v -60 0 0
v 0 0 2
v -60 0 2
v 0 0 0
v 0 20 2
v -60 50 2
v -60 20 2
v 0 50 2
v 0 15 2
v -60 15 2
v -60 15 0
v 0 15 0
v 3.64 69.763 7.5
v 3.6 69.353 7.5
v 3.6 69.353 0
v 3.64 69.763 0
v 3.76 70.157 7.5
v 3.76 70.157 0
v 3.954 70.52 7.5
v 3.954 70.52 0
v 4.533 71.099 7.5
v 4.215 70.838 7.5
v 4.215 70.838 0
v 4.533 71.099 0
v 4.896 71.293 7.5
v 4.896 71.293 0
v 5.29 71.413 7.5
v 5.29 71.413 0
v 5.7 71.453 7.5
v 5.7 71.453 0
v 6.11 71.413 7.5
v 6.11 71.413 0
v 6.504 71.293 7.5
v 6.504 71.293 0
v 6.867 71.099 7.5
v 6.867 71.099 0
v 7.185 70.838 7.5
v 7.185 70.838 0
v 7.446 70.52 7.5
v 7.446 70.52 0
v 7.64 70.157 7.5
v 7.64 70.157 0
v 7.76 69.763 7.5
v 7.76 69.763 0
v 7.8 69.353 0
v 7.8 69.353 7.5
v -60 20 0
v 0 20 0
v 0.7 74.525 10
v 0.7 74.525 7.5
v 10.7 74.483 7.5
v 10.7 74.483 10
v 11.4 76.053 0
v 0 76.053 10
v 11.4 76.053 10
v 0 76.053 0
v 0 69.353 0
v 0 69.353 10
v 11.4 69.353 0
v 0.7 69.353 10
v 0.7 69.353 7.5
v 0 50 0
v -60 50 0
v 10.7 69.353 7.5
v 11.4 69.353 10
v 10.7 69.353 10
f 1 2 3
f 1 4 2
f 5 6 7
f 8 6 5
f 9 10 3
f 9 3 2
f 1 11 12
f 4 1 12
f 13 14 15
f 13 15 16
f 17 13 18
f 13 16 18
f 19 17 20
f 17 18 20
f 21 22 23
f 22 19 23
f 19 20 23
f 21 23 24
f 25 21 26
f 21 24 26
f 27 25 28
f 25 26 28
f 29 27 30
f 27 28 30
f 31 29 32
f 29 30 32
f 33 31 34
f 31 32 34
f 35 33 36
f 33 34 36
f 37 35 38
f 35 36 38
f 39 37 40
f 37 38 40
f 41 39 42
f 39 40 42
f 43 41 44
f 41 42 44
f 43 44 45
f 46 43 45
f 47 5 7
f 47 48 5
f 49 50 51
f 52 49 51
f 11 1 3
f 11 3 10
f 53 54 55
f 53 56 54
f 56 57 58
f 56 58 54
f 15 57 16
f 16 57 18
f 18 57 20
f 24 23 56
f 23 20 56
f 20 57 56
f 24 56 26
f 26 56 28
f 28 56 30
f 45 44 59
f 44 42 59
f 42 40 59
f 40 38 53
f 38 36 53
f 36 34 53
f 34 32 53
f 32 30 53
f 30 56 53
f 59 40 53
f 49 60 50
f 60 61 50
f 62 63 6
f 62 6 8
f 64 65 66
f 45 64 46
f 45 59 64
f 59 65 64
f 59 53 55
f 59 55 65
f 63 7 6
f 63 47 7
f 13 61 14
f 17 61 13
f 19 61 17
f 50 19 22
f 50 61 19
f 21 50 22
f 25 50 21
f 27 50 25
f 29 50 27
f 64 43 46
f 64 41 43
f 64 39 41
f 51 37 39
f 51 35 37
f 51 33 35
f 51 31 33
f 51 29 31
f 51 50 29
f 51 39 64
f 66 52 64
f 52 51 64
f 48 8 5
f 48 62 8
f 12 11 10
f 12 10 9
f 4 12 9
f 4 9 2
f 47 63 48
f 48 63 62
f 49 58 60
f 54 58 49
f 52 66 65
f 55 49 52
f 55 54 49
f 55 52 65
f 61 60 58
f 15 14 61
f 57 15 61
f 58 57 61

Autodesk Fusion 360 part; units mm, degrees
sketch "Sketch1" plane through (0, 0, 0) normal (0, 0, 1) x (1, 0, 0)
  line L0 (0, 0) -> (-60, 0)
  line L1 (-60, 0) -> (-60, 15)
  line L2 (-60, 15) -> (0, 15)
  line L3 (0, 15) -> (0, 0)
  line L4 (-60, 50) -> (0, 50)
  line L5 (0, 50) -> (0, 20)
  line L6 (0, 20) -> (-60, 20)
  line L7 (-60, 20) -> (-60, 50)
  dimension "d1" = 60
  dimension "d2" = 15
  dimension "d3" = 60
  dimension "d4" = 30
extrude "Extrude1" add sketch "Sketch1" along normal blind 2 makes body 1 at (-40, 30, 0) makes body 2 at (-20, 5, 0)
sketch "Sketch2" plane through (0, 0, 0) normal (0, 0, 1) x (1, 0, 0)
  line L0 (0, 76.0529) -> (11.4, 76.0529)
  line L1 (11.4, 76.0529) -> (11.4, 69.3529)
  line L2 (0, 69.3529) -> (0, 76.0529)
  line L3 (0, 62.6529) -> (0, 63.2769)
  line L4 (0, 62.6529) -> (11.4, 76.0529) construction
  line L5 (0, 76.0529) -> (11.4, 62.6529) construction
  line L6 (0.7, 69.3529) -> (0.7, 74.5246)
  line L7 (0.7, 74.5246) -> (10.6999, 74.4829)
  line L8 (10.6999, 74.4829) -> (10.6999, 69.3529)
  line L9 (10.7527, 64.2056) -> (0.7, 74.5246) construction
  line L10 (0.6714, 64.2531) -> (10.6999, 74.4829) construction
  arc A0 (4.2151, 67.8679) -> (4.3392, 67.7534) centre (5.7, 69.3529) ccw
  arc A1 (7.0608, 67.7534) -> (7.1849, 67.8679) centre (5.7, 69.3529) ccw
  arc A2 (7.8, 69.3529) -> (3.6, 69.3529) centre (5.7, 69.3529) ccw
  line L11 (11.4, 69.3529) -> (7.8, 69.3529)
  line L12 (3.6, 69.3529) -> (0, 69.3529)
  dimension "d7" = 11.4
  dimension "d8" = 13.4
  dimension "d9" = 10
  dimension "d11" = 4.2
  dimension "d20" = 0.7
extrude "Extrude4" add sketch "Sketch2" along normal blind 10 separate body contours L0 L1 L2 L6 L7 L8 L11 L12 makes body 3
extrude "Extrude5" add sketch "Sketch2" along normal blind 7.5 contours L6 L7 L8 A2 L11 L12 bodies 3
